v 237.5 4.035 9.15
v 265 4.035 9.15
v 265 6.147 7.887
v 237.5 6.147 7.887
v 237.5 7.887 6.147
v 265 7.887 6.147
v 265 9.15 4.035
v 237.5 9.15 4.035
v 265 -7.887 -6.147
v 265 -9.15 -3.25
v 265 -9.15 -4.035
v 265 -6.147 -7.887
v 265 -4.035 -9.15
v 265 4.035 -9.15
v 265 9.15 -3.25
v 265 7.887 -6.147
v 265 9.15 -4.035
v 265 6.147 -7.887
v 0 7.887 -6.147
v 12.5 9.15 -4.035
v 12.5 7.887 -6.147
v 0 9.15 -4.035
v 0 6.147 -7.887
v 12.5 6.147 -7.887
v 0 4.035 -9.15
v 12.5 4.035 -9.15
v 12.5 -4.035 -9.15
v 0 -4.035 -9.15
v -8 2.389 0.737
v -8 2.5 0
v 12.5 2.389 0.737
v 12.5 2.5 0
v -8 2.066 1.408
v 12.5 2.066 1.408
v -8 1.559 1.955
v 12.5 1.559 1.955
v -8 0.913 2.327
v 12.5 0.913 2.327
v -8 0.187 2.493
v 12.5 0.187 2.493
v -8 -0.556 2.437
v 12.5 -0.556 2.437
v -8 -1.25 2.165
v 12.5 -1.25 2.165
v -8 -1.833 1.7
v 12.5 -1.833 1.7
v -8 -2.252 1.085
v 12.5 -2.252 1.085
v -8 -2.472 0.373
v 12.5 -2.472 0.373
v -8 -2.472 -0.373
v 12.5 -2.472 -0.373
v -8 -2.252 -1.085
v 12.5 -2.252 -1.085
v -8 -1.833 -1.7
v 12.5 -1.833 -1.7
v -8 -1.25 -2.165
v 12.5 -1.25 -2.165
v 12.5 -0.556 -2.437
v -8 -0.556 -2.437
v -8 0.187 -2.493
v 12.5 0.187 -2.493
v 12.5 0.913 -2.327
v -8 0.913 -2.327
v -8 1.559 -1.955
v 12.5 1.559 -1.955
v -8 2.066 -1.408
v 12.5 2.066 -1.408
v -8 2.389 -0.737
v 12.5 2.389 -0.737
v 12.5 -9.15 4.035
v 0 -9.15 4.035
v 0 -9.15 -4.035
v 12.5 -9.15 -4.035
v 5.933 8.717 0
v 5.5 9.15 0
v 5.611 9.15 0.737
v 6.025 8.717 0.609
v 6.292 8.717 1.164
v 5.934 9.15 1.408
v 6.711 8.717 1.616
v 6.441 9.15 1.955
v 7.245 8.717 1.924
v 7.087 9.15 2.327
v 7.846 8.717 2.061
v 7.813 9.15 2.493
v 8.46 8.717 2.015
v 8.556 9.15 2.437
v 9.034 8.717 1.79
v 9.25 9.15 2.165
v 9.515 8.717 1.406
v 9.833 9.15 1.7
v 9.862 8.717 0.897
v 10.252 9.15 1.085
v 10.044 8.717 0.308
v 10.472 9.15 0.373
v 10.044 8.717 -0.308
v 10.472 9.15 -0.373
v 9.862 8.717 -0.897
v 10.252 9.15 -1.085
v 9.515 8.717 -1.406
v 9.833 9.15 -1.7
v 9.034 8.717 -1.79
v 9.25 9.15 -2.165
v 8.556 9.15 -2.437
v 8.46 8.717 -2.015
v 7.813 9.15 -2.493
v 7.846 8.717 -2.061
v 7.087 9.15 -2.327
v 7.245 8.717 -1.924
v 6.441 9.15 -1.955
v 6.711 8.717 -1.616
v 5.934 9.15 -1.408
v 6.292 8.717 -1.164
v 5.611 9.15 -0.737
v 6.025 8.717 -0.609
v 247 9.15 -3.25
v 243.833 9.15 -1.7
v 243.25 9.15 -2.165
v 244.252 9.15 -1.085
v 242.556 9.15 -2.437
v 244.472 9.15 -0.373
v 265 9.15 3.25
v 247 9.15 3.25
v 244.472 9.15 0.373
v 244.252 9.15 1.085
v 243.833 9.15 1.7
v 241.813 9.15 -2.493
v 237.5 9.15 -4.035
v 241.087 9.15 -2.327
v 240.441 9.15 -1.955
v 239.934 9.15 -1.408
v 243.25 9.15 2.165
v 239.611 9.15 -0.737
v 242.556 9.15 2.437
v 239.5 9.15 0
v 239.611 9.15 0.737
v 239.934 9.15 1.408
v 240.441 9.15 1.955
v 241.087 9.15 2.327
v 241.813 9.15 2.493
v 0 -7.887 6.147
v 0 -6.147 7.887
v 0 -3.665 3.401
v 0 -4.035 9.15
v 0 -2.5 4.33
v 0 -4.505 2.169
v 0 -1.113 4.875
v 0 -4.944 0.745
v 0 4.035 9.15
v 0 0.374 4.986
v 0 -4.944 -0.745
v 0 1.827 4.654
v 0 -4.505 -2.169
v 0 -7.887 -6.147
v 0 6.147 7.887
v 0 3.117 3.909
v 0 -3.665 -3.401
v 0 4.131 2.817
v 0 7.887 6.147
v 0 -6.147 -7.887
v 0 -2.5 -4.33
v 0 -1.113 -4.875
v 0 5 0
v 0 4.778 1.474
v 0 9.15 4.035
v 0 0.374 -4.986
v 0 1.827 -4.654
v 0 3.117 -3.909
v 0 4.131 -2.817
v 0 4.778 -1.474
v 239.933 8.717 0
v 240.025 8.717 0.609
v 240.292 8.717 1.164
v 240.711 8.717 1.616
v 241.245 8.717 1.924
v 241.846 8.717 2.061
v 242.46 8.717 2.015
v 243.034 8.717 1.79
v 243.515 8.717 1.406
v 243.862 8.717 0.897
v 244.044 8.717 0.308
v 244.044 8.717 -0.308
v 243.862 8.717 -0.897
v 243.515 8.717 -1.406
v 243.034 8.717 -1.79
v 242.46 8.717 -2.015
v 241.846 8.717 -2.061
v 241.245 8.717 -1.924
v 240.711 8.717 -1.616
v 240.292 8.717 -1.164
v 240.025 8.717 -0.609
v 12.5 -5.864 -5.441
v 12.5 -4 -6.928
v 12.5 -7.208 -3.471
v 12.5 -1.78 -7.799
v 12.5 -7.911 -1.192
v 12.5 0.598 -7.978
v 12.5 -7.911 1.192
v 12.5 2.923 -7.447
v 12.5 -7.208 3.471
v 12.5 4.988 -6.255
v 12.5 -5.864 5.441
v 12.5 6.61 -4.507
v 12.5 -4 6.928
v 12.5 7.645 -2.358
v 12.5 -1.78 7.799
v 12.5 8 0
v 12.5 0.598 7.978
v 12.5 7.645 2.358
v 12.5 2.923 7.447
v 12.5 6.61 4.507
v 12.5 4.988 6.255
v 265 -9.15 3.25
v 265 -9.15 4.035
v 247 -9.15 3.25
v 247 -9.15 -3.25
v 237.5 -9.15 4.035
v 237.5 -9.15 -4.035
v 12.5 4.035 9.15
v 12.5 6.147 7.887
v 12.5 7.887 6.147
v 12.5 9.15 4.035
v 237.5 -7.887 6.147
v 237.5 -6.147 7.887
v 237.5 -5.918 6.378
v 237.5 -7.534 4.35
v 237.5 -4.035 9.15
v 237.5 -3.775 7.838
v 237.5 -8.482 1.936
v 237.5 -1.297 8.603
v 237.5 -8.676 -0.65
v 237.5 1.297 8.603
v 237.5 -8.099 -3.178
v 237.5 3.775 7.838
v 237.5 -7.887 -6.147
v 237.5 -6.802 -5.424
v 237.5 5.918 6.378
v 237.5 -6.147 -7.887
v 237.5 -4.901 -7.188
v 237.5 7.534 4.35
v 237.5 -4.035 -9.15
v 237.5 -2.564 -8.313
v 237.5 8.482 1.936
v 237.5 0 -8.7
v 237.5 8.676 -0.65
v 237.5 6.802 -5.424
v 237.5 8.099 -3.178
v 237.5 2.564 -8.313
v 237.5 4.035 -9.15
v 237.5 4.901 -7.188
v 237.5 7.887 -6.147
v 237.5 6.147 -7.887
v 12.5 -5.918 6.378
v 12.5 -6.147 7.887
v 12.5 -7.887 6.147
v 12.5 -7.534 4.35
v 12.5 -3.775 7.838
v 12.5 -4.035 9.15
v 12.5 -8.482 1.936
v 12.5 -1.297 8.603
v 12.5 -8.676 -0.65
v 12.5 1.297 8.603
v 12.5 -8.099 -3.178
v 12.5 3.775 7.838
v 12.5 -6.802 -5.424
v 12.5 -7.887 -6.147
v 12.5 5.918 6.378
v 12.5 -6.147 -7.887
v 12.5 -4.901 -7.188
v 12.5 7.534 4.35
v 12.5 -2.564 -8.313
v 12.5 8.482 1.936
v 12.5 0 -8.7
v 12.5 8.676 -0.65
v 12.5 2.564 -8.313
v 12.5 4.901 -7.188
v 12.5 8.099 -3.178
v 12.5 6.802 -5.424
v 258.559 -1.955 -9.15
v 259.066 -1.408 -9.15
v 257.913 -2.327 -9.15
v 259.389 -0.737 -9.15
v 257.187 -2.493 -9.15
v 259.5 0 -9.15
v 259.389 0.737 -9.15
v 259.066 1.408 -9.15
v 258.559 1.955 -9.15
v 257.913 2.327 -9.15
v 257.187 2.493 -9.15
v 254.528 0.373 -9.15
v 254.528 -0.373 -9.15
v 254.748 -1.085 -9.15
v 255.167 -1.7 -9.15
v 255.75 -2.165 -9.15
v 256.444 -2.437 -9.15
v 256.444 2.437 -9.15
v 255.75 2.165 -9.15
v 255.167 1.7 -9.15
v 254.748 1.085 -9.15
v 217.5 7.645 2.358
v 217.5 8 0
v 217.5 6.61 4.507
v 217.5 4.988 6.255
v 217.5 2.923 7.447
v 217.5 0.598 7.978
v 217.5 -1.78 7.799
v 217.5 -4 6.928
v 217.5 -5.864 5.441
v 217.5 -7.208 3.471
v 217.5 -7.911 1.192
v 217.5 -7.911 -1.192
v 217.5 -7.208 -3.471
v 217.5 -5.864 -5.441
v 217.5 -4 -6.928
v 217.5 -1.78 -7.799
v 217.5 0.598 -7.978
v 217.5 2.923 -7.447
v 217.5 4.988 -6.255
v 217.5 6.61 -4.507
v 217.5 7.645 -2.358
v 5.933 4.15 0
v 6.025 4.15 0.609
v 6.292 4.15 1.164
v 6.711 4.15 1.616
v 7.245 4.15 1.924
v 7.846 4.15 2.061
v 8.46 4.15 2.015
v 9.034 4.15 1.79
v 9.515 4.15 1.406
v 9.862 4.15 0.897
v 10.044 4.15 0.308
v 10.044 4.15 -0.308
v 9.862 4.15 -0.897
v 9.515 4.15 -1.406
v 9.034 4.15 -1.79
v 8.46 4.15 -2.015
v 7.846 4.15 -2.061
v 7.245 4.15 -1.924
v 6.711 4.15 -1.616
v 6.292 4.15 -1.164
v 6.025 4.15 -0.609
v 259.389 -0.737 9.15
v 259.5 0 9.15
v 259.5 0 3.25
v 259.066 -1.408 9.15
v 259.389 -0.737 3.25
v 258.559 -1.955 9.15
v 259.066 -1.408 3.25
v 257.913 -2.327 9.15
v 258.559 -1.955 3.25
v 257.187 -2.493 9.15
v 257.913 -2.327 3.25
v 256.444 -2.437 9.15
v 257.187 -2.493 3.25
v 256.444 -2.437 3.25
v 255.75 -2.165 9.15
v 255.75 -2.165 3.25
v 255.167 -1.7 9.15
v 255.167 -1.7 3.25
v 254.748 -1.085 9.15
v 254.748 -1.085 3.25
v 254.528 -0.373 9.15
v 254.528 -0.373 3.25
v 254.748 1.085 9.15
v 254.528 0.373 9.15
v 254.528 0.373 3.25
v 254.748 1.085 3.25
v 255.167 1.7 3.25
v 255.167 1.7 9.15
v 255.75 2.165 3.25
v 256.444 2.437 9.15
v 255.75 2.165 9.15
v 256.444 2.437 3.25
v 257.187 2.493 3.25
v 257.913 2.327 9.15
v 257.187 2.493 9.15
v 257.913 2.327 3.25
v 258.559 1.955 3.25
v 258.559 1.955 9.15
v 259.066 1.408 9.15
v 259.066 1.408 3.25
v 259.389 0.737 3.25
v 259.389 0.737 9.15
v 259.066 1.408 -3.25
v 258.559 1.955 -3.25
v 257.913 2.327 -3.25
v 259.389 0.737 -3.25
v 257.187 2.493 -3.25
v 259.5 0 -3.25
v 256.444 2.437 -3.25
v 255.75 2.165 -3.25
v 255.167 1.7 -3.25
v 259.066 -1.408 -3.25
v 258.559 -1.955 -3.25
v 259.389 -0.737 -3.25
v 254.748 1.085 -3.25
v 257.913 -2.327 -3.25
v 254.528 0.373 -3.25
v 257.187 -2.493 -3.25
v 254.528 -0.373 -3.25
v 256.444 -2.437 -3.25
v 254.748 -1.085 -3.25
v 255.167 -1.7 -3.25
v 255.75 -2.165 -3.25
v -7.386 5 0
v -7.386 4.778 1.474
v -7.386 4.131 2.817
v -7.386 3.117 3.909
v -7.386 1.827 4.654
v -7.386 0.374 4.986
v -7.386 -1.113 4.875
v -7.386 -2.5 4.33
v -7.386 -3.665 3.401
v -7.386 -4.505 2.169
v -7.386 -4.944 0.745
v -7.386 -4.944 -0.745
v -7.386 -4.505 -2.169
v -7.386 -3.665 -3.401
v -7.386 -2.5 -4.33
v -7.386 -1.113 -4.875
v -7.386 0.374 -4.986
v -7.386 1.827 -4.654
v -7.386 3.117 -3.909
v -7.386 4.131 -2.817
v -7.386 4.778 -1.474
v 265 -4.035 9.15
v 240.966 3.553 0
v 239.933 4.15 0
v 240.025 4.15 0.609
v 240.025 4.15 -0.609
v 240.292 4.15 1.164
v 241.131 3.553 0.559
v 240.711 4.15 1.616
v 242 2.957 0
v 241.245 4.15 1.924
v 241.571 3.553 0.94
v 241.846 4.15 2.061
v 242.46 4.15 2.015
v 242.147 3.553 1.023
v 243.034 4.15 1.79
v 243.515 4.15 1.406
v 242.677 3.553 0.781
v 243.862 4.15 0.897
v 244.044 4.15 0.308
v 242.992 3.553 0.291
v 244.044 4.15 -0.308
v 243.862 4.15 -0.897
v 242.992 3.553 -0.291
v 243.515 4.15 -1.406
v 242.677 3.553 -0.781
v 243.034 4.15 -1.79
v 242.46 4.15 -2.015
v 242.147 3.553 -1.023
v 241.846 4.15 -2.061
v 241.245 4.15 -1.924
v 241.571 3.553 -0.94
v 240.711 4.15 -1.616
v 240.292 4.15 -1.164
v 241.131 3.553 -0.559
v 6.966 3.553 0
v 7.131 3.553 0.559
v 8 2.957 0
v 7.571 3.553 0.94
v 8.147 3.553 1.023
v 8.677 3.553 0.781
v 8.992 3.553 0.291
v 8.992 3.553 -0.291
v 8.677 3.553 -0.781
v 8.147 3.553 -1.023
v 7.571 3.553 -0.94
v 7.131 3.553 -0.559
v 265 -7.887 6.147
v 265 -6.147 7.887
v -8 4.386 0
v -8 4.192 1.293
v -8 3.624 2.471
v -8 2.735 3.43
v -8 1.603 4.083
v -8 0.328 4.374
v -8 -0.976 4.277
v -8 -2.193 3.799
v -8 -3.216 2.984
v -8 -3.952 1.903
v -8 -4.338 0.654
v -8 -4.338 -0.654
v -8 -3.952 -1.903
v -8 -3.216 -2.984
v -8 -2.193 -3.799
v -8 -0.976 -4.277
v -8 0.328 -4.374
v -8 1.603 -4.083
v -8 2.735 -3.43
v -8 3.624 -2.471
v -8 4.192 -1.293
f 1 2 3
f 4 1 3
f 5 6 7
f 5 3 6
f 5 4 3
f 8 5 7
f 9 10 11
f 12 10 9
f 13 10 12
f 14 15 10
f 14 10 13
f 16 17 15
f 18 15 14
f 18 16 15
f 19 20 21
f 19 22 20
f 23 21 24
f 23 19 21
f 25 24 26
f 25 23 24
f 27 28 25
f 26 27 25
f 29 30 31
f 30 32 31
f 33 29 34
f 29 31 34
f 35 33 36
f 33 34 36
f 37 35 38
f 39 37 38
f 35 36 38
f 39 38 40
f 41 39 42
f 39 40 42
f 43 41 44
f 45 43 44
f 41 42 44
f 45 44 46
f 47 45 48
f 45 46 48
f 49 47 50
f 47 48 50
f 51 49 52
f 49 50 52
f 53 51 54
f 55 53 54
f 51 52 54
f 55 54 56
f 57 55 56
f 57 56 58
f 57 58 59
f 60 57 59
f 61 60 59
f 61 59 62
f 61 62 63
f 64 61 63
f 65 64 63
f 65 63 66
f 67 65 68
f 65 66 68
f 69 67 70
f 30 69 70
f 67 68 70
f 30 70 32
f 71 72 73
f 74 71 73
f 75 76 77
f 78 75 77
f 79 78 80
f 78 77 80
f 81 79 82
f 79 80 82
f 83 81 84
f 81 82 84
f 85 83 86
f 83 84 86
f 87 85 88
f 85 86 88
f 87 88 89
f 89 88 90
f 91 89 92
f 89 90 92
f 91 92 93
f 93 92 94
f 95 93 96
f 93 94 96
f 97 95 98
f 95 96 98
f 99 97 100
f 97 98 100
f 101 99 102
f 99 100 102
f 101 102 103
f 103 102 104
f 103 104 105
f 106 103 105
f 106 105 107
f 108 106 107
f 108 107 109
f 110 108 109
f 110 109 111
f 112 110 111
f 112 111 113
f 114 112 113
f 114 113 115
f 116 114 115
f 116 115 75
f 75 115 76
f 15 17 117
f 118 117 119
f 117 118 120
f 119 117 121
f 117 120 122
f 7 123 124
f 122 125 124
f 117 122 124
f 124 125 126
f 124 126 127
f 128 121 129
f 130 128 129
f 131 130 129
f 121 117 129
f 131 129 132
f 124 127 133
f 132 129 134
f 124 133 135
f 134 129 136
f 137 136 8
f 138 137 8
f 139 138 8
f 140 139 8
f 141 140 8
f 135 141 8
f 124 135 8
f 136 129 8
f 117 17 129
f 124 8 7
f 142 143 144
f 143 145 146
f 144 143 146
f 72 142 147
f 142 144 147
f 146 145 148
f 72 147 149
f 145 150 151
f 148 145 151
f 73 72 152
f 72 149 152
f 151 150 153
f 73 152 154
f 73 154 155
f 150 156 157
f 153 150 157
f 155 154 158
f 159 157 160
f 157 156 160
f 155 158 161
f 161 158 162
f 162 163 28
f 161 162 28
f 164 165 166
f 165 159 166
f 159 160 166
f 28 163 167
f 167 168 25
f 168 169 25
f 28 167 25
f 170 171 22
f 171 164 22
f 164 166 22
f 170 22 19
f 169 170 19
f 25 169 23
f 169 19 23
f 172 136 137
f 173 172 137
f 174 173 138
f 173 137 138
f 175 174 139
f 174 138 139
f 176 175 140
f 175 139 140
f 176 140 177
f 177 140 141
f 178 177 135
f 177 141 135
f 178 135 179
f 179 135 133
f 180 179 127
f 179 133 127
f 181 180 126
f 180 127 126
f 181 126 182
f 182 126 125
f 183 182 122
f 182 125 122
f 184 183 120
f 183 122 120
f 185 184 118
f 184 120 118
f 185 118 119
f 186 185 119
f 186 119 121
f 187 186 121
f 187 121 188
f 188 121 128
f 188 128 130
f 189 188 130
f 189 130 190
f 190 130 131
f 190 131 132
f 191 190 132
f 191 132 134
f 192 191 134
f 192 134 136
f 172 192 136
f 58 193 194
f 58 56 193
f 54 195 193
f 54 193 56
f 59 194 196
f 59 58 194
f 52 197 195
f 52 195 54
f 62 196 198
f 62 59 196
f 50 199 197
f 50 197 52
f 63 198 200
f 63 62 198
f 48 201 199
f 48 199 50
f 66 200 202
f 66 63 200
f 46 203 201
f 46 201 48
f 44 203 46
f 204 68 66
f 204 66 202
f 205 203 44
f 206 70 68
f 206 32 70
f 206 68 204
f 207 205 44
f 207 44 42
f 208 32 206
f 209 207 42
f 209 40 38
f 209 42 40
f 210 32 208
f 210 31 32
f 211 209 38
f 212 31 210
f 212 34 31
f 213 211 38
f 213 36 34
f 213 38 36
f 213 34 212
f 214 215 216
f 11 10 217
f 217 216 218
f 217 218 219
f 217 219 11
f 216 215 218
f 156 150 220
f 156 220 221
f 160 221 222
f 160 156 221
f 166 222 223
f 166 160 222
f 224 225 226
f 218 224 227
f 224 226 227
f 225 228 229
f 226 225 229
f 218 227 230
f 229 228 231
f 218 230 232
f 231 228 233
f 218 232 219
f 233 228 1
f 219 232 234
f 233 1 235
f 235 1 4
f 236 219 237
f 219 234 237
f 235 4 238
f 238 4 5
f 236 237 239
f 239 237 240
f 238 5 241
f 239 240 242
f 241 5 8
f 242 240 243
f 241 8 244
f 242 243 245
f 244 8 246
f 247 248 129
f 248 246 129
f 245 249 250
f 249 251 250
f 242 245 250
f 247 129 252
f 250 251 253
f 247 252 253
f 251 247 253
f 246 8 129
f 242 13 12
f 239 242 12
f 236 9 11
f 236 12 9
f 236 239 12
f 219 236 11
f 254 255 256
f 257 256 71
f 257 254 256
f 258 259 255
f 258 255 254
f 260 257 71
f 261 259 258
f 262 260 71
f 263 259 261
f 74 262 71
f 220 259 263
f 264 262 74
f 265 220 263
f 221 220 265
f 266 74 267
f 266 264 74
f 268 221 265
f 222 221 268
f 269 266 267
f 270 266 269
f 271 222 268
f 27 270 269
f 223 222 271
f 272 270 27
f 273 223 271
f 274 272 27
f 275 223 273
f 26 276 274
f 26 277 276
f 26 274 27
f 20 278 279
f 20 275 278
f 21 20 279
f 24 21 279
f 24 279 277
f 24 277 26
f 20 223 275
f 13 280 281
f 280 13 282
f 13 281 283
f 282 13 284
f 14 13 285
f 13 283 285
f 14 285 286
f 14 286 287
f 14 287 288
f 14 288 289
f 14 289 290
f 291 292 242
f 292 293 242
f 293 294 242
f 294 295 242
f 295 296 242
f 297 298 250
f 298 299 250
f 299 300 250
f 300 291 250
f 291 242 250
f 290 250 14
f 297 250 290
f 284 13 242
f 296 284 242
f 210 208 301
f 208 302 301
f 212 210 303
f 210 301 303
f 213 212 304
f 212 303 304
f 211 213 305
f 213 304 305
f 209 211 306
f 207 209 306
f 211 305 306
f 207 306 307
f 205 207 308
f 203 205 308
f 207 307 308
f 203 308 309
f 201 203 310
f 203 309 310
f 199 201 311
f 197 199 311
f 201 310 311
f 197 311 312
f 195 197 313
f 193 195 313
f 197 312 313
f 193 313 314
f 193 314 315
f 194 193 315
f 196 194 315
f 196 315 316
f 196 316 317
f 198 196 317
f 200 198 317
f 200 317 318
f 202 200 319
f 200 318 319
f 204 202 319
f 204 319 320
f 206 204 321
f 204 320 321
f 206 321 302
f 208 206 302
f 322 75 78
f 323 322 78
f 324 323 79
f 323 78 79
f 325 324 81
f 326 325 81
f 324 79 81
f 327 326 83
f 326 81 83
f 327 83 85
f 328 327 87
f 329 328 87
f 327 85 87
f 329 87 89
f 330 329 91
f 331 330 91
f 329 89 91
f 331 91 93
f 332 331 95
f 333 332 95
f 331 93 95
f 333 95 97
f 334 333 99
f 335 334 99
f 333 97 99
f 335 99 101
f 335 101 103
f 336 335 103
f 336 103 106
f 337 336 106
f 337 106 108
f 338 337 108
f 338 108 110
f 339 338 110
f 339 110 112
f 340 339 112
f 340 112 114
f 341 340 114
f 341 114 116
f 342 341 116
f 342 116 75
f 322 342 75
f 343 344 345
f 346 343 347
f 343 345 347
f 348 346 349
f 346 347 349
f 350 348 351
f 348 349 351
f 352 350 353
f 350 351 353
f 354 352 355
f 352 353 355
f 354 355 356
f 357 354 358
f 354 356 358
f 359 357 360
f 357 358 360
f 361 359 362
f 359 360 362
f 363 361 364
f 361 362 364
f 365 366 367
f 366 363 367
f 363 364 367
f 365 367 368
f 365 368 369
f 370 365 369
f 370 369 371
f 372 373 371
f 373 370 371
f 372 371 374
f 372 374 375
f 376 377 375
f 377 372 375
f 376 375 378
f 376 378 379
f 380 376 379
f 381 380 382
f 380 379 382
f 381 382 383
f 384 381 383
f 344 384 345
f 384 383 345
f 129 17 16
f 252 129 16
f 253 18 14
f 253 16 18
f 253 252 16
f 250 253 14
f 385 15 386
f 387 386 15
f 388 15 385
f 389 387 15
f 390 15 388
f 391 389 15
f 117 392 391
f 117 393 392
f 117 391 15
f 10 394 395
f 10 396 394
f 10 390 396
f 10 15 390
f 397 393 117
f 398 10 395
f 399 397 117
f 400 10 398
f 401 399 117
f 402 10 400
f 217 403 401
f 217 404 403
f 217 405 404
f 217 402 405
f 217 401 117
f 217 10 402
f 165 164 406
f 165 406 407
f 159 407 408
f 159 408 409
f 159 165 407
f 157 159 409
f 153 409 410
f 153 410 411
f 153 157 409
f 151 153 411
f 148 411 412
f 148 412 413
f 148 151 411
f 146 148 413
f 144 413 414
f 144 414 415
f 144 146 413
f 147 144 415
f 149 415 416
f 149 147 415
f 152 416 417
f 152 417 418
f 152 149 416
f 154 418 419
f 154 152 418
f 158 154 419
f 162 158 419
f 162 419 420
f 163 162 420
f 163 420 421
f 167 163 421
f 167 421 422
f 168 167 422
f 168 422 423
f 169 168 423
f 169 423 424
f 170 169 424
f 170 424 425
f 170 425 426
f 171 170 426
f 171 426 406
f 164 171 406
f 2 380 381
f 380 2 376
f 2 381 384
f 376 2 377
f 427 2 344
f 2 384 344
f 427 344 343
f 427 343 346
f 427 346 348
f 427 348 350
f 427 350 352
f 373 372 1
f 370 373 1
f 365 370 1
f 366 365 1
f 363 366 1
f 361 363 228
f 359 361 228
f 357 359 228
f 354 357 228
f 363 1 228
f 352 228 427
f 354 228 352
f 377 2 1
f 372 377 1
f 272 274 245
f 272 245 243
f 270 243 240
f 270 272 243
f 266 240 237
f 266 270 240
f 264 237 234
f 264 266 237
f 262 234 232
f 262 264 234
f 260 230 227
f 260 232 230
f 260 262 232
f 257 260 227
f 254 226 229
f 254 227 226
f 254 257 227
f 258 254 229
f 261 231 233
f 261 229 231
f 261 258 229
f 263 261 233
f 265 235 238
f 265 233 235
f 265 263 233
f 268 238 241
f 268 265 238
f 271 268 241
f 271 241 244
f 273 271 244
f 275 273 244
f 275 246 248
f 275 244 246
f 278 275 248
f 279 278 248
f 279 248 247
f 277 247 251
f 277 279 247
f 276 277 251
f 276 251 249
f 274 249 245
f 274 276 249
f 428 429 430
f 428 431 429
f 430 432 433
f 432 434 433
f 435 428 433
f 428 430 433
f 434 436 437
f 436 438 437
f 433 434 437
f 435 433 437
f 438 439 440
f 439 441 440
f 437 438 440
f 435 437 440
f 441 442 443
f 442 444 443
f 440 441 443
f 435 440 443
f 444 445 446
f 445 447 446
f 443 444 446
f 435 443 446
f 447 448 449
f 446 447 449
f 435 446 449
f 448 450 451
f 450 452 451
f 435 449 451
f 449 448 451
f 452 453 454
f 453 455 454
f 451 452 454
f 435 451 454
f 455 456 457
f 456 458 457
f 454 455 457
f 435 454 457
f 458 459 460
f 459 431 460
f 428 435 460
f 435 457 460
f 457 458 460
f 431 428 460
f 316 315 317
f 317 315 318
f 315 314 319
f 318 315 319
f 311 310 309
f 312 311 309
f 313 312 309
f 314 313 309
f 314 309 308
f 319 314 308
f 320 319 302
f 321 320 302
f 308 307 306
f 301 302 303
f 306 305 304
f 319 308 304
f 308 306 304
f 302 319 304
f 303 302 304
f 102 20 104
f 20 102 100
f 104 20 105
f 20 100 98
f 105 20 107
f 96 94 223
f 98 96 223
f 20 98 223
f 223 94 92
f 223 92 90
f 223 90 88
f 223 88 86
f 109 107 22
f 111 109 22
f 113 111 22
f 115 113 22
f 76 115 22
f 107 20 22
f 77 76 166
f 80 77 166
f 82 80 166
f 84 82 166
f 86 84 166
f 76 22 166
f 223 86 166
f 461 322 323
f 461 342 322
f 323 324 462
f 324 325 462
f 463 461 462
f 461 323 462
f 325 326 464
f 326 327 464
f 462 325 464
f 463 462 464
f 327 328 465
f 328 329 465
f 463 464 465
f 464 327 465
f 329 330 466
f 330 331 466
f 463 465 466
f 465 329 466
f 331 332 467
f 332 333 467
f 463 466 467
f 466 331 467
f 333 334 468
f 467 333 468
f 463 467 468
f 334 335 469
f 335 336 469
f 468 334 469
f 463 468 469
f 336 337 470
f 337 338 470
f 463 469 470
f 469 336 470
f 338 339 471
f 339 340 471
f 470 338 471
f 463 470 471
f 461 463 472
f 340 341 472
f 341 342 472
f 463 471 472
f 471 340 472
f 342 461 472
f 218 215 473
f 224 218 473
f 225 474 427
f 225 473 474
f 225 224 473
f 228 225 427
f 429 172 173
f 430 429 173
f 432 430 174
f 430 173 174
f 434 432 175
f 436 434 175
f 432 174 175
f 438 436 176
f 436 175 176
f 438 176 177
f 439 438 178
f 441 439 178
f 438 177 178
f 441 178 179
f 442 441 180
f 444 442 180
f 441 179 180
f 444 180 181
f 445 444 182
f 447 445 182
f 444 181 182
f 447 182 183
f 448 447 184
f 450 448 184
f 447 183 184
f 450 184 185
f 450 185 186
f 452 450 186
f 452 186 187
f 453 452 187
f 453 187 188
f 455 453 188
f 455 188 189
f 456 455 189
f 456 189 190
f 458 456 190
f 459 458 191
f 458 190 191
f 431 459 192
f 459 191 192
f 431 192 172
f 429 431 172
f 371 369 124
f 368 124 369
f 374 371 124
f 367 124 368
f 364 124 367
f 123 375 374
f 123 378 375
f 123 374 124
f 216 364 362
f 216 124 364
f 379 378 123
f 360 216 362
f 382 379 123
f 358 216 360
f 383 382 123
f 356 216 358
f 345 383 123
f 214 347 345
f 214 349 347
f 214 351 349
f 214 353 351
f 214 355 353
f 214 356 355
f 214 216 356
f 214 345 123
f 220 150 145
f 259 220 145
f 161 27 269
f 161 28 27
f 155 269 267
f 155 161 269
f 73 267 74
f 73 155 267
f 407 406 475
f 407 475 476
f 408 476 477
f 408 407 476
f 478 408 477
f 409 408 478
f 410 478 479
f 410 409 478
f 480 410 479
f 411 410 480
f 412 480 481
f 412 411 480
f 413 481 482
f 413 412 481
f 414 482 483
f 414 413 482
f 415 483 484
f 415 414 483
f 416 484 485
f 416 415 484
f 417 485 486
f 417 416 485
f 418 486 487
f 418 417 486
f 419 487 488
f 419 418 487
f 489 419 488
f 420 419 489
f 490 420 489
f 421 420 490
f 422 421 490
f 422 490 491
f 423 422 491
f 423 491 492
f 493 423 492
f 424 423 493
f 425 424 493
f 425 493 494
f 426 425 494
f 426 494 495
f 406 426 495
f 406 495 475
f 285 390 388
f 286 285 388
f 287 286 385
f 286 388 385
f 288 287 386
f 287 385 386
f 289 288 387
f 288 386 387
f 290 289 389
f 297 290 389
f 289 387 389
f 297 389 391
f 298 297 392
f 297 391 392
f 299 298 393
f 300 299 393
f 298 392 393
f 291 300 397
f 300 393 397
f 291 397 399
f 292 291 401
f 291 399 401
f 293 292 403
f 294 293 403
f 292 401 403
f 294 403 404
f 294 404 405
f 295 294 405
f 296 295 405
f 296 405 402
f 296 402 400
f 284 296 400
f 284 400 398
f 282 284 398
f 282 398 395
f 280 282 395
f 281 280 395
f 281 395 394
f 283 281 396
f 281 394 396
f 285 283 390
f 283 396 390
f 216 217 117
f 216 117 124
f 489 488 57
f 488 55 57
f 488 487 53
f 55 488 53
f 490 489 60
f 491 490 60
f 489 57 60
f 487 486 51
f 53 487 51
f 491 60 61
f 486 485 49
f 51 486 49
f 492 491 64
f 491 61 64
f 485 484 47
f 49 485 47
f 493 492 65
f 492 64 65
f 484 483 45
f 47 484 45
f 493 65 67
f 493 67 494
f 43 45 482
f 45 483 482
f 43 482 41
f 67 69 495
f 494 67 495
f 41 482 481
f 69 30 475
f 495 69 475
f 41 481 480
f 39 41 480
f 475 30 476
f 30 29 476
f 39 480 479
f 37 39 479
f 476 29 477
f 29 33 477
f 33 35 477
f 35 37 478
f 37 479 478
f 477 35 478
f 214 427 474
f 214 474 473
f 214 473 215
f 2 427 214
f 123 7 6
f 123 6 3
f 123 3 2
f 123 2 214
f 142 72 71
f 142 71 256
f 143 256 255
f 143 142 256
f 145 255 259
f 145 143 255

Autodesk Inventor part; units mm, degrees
sketch "Sketch_8" plane through (0, 0, 0) normal (0, 0, 1) x (1, 0, 0)
  line L0 (0, 0) -> (-8, 0)
  line L1 (-8, 0) -> (-8, 4.3865)
  line L2 (-8, 4.3865) -> (-7.3865, 5)
  line L3 (-7.3865, 5) -> (0, 5)
  line L4 (0, 5) -> (0, 0)
  line L5 (0, 0) -> (-8, 0)
revolve "Revolution1" add sketch "Sketch_8" angle 360 about axis through (0, 0, 0) along (1, 0, 0)
thread "Thread1" size "M10x1" class "6g" standard "ISO Metric profile" length 5.8865
sketch "Sketch_9" plane through (0, 0, 0) normal (1, 0, 0) x (0, 0, -1)
  line L0 (-9.15, 4.0345) -> (-9.15, -4.0345)
  arc A0 (-9.15, -4.0345) -> (-4.0345, -9.15) centre (0, 0) ccw
  line L1 (-4.0345, -9.15) -> (4.0345, -9.15)
  arc A1 (4.0345, -9.15) -> (9.15, -4.0345) centre (0, 0) ccw
  line L2 (9.15, -4.0345) -> (9.15, 4.0345)
  arc A2 (9.15, 4.0345) -> (4.0345, 9.15) centre (0, 0) ccw
  line L3 (4.0345, 9.15) -> (-4.0345, 9.15)
  arc A3 (-4.0345, 9.15) -> (-9.15, 4.0345) centre (0, 0) ccw
extrude "Extrusion1" add sketch "Sketch_9" along normal blind 12.5
sketch "Sketch_11" plane through (12.5, 0, 0) normal (1, 0, 0) x (0, 0, -1)
  circle A0 centre (0, 0) radius 8.7
extrude "Extrusion2" add sketch "Sketch_11" along normal blind 225
sketch "Sketch_10" plane through (237.5, 0, 0) normal (1, 0, 0) x (0, 0, -1)
  line L0 (-9.15, 4.0345) -> (-9.15, -4.0345)
  arc A0 (-9.15, -4.0345) -> (-4.0345, -9.15) centre (0, 0) ccw
  line L1 (-4.0345, -9.15) -> (4.0345, -9.15)
  arc A1 (4.0345, -9.15) -> (9.15, -4.0345) centre (0, 0) ccw
  line L2 (9.15, -4.0345) -> (9.15, 4.0345)
  arc A2 (9.15, 4.0345) -> (4.0345, 9.15) centre (0, 0) ccw
  line L3 (4.0345, 9.15) -> (-4.0345, 9.15)
  arc A3 (-4.0345, 9.15) -> (-9.15, 4.0345) centre (0, 0) ccw
extrude "Extrusion3" add sketch "Sketch_10" along normal blind 27.5
sketch "Sketch7" plane through (0, 0, 0) normal (0, 0, 1) x (1, 0, 0)
  line L0 (8, 9.15) -> (8, 4.15)
  line L1 (8, 2.9566) -> (5.933, 4.15)
  line L2 (5.933, 4.15) -> (5.933, 8.717)
  line L3 (5.933, 8.717) -> (5.5, 9.15)
  line L4 (5.5, 9.15) -> (8, 9.15)
  line L5 (8, 9.15) -> (8, 2.9566)
revolve "Revolution2" cut sketch "Sketch7" angle 360 about axis through (8, 9.15, 0) along (0, 1, 0)
thread "Thread2" size "M5x0.8" class "6H" standard "ISO Metric profile" full length
sketch "Sketch_7" plane through (0, 0, 0) normal (0, 0, 1) x (1, 0, 0)
  line L0 (242, 9.15) -> (242, 4.15)
  line L1 (242, 2.9566) -> (239.933, 4.15)
  line L2 (239.933, 4.15) -> (239.933, 8.717)
  line L3 (239.933, 8.717) -> (239.5, 9.15)
  line L4 (239.5, 9.15) -> (242, 9.15)
  line L5 (242, 9.15) -> (242, 2.9566)
revolve "Revolution3" cut sketch "Sketch_7" angle 360 about axis through (242, 9.15, 0) along (0, 1, 0)
thread "Thread3" size "M5x0.8" class "6H" standard "ISO Metric profile" full length
sketch "Sketch_16" plane through (0, 0, 0) normal (0, 0, 1) x (1, 0, 0)
  line L0 (217.5, 0) -> (-8, 0)
  line L1 (-8, 0) -> (-8, 2.5)
  line L2 (-8, 2.5) -> (12.5, 2.5)
  line L3 (12.5, 2.5) -> (12.5, 8)
  line L4 (12.5, 8) -> (217.5, 8)
  line L5 (217.5, 8) -> (217.5, 0)
  line L6 (217.5, 0) -> (-8, 0)
revolve "Revolution4" cut sketch "Sketch_16" angle 360 about axis through (217.5, 0, 0) along (1, 0, 0)
sketch "Sketch_3" plane through (0, 0, 0) normal (0, 1, 0) x (-1, 0, 0)
  line L0 (-247, 3.25) -> (-265, 3.25)
  line L1 (-265, 3.25) -> (-265, -3.25)
  line L2 (-265, -3.25) -> (-247, -3.25)
  line L3 (-247, -3.25) -> (-247, 3.25)
extrude "Extrusion4" cut sketch "Sketch_3" along normal mid plane 18.3
sketch "Sketch_13" plane through (0, 0, 0) normal (0, 0, 1) x (1, 0, 0)
  circle A0 centre (257, 0) radius 2.5
extrude "Extrusion5" cut sketch "Sketch_13" along normal mid plane 18.3
ref_plane "BODY_N_XY" through (257, 0, 0) normal (0, 0, -1) x (1, 0, 0)
ref_plane "BODY_N_YZ" through (257, 0, 0) normal (1, 0, 0) x (0, -1, 0)
ref_plane "BODY_N_ZX" through (257, 0, 0) normal (0, -1, 0) x (0, 0, -1)
ref_plane "BODY_PIN_XY" through (257, 0, 0) normal (-1, 0, 0) x (0, 0, -1)
ref_plane "BODY_PIN_YZ" through (257, 0, 0) normal (0, 0, -1) x (0, -1, 0)
ref_plane "BODY_PIN_ZX" through (257, 0, 0) normal (0, -1, 0) x (-1, 0, 0)
ref_plane "NUT2_XY" through (247, 0, 0) normal (1, 0, 0) x (0, 0, -1)
ref_plane "NUT2_YZ" through (247, 0, 0) normal (0, 0, -1) x (0, 1, 0)
ref_plane "NUT2_ZX" through (247, 0, 0) normal (0, 1, 0) x (1, 0, 0)
ref_plane "SW1_XY" through (17.5, 0, 0) normal (1, 0, 0) x (0, 0, -1)
ref_plane "SW1_YZ" through (17.5, 0, 0) normal (0, 0, -1) x (0, 1, 0)
ref_plane "SW1_ZX" through (17.5, 0, 0) normal (0, 1, 0) x (1, 0, 0)
ref_plane "SW2_XY" through (232.5, 0, 0) normal (-1, 0, 0) x (0, 0, -1)
ref_plane "SW2_YZ" through (232.5, 0, 0) normal (0, 0, -1) x (0, -1, 0)
ref_plane "SW2_ZX" through (232.5, 0, 0) normal (0, -1, 0) x (-1, 0, 0)
ref_plane "SW_R1_XY" through (17.5, -14.15, 0) normal (1, 0, 0) x (0, 0, -1)
ref_plane "SW_R1_YZ" through (17.5, -14.15, 0) normal (0, 0, -1) x (0, 1, 0)
ref_plane "SW_R1_ZX" through (17.5, -14.15, 0) normal (0, 1, 0) x (1, 0, 0)
ref_plane "SW_R2_XY" through (232.5, -14.15, 0) normal (-1, 0, 0) x (0, 0, -1)
ref_plane "SW_R2_YZ" through (232.5, -14.15, 0) normal (0, 0, -1) x (0, -1, 0)
ref_plane "SW_R2_ZX" through (232.5, -14.15, 0) normal (0, -1, 0) x (-1, 0, 0)
ref_plane "body_XY" through (0, 0, 0) normal (1, 0, 0) x (0, 0, -1)
ref_plane "body_YZ" through (0, 0, 0) normal (0, 0, -1) x (0, 1, 0)
ref_plane "body_ZX" through (0, 0, 0) normal (0, 1, 0) x (1, 0, 0)
properties part number "CJ2D16-200Z(1_0)_BODY"
